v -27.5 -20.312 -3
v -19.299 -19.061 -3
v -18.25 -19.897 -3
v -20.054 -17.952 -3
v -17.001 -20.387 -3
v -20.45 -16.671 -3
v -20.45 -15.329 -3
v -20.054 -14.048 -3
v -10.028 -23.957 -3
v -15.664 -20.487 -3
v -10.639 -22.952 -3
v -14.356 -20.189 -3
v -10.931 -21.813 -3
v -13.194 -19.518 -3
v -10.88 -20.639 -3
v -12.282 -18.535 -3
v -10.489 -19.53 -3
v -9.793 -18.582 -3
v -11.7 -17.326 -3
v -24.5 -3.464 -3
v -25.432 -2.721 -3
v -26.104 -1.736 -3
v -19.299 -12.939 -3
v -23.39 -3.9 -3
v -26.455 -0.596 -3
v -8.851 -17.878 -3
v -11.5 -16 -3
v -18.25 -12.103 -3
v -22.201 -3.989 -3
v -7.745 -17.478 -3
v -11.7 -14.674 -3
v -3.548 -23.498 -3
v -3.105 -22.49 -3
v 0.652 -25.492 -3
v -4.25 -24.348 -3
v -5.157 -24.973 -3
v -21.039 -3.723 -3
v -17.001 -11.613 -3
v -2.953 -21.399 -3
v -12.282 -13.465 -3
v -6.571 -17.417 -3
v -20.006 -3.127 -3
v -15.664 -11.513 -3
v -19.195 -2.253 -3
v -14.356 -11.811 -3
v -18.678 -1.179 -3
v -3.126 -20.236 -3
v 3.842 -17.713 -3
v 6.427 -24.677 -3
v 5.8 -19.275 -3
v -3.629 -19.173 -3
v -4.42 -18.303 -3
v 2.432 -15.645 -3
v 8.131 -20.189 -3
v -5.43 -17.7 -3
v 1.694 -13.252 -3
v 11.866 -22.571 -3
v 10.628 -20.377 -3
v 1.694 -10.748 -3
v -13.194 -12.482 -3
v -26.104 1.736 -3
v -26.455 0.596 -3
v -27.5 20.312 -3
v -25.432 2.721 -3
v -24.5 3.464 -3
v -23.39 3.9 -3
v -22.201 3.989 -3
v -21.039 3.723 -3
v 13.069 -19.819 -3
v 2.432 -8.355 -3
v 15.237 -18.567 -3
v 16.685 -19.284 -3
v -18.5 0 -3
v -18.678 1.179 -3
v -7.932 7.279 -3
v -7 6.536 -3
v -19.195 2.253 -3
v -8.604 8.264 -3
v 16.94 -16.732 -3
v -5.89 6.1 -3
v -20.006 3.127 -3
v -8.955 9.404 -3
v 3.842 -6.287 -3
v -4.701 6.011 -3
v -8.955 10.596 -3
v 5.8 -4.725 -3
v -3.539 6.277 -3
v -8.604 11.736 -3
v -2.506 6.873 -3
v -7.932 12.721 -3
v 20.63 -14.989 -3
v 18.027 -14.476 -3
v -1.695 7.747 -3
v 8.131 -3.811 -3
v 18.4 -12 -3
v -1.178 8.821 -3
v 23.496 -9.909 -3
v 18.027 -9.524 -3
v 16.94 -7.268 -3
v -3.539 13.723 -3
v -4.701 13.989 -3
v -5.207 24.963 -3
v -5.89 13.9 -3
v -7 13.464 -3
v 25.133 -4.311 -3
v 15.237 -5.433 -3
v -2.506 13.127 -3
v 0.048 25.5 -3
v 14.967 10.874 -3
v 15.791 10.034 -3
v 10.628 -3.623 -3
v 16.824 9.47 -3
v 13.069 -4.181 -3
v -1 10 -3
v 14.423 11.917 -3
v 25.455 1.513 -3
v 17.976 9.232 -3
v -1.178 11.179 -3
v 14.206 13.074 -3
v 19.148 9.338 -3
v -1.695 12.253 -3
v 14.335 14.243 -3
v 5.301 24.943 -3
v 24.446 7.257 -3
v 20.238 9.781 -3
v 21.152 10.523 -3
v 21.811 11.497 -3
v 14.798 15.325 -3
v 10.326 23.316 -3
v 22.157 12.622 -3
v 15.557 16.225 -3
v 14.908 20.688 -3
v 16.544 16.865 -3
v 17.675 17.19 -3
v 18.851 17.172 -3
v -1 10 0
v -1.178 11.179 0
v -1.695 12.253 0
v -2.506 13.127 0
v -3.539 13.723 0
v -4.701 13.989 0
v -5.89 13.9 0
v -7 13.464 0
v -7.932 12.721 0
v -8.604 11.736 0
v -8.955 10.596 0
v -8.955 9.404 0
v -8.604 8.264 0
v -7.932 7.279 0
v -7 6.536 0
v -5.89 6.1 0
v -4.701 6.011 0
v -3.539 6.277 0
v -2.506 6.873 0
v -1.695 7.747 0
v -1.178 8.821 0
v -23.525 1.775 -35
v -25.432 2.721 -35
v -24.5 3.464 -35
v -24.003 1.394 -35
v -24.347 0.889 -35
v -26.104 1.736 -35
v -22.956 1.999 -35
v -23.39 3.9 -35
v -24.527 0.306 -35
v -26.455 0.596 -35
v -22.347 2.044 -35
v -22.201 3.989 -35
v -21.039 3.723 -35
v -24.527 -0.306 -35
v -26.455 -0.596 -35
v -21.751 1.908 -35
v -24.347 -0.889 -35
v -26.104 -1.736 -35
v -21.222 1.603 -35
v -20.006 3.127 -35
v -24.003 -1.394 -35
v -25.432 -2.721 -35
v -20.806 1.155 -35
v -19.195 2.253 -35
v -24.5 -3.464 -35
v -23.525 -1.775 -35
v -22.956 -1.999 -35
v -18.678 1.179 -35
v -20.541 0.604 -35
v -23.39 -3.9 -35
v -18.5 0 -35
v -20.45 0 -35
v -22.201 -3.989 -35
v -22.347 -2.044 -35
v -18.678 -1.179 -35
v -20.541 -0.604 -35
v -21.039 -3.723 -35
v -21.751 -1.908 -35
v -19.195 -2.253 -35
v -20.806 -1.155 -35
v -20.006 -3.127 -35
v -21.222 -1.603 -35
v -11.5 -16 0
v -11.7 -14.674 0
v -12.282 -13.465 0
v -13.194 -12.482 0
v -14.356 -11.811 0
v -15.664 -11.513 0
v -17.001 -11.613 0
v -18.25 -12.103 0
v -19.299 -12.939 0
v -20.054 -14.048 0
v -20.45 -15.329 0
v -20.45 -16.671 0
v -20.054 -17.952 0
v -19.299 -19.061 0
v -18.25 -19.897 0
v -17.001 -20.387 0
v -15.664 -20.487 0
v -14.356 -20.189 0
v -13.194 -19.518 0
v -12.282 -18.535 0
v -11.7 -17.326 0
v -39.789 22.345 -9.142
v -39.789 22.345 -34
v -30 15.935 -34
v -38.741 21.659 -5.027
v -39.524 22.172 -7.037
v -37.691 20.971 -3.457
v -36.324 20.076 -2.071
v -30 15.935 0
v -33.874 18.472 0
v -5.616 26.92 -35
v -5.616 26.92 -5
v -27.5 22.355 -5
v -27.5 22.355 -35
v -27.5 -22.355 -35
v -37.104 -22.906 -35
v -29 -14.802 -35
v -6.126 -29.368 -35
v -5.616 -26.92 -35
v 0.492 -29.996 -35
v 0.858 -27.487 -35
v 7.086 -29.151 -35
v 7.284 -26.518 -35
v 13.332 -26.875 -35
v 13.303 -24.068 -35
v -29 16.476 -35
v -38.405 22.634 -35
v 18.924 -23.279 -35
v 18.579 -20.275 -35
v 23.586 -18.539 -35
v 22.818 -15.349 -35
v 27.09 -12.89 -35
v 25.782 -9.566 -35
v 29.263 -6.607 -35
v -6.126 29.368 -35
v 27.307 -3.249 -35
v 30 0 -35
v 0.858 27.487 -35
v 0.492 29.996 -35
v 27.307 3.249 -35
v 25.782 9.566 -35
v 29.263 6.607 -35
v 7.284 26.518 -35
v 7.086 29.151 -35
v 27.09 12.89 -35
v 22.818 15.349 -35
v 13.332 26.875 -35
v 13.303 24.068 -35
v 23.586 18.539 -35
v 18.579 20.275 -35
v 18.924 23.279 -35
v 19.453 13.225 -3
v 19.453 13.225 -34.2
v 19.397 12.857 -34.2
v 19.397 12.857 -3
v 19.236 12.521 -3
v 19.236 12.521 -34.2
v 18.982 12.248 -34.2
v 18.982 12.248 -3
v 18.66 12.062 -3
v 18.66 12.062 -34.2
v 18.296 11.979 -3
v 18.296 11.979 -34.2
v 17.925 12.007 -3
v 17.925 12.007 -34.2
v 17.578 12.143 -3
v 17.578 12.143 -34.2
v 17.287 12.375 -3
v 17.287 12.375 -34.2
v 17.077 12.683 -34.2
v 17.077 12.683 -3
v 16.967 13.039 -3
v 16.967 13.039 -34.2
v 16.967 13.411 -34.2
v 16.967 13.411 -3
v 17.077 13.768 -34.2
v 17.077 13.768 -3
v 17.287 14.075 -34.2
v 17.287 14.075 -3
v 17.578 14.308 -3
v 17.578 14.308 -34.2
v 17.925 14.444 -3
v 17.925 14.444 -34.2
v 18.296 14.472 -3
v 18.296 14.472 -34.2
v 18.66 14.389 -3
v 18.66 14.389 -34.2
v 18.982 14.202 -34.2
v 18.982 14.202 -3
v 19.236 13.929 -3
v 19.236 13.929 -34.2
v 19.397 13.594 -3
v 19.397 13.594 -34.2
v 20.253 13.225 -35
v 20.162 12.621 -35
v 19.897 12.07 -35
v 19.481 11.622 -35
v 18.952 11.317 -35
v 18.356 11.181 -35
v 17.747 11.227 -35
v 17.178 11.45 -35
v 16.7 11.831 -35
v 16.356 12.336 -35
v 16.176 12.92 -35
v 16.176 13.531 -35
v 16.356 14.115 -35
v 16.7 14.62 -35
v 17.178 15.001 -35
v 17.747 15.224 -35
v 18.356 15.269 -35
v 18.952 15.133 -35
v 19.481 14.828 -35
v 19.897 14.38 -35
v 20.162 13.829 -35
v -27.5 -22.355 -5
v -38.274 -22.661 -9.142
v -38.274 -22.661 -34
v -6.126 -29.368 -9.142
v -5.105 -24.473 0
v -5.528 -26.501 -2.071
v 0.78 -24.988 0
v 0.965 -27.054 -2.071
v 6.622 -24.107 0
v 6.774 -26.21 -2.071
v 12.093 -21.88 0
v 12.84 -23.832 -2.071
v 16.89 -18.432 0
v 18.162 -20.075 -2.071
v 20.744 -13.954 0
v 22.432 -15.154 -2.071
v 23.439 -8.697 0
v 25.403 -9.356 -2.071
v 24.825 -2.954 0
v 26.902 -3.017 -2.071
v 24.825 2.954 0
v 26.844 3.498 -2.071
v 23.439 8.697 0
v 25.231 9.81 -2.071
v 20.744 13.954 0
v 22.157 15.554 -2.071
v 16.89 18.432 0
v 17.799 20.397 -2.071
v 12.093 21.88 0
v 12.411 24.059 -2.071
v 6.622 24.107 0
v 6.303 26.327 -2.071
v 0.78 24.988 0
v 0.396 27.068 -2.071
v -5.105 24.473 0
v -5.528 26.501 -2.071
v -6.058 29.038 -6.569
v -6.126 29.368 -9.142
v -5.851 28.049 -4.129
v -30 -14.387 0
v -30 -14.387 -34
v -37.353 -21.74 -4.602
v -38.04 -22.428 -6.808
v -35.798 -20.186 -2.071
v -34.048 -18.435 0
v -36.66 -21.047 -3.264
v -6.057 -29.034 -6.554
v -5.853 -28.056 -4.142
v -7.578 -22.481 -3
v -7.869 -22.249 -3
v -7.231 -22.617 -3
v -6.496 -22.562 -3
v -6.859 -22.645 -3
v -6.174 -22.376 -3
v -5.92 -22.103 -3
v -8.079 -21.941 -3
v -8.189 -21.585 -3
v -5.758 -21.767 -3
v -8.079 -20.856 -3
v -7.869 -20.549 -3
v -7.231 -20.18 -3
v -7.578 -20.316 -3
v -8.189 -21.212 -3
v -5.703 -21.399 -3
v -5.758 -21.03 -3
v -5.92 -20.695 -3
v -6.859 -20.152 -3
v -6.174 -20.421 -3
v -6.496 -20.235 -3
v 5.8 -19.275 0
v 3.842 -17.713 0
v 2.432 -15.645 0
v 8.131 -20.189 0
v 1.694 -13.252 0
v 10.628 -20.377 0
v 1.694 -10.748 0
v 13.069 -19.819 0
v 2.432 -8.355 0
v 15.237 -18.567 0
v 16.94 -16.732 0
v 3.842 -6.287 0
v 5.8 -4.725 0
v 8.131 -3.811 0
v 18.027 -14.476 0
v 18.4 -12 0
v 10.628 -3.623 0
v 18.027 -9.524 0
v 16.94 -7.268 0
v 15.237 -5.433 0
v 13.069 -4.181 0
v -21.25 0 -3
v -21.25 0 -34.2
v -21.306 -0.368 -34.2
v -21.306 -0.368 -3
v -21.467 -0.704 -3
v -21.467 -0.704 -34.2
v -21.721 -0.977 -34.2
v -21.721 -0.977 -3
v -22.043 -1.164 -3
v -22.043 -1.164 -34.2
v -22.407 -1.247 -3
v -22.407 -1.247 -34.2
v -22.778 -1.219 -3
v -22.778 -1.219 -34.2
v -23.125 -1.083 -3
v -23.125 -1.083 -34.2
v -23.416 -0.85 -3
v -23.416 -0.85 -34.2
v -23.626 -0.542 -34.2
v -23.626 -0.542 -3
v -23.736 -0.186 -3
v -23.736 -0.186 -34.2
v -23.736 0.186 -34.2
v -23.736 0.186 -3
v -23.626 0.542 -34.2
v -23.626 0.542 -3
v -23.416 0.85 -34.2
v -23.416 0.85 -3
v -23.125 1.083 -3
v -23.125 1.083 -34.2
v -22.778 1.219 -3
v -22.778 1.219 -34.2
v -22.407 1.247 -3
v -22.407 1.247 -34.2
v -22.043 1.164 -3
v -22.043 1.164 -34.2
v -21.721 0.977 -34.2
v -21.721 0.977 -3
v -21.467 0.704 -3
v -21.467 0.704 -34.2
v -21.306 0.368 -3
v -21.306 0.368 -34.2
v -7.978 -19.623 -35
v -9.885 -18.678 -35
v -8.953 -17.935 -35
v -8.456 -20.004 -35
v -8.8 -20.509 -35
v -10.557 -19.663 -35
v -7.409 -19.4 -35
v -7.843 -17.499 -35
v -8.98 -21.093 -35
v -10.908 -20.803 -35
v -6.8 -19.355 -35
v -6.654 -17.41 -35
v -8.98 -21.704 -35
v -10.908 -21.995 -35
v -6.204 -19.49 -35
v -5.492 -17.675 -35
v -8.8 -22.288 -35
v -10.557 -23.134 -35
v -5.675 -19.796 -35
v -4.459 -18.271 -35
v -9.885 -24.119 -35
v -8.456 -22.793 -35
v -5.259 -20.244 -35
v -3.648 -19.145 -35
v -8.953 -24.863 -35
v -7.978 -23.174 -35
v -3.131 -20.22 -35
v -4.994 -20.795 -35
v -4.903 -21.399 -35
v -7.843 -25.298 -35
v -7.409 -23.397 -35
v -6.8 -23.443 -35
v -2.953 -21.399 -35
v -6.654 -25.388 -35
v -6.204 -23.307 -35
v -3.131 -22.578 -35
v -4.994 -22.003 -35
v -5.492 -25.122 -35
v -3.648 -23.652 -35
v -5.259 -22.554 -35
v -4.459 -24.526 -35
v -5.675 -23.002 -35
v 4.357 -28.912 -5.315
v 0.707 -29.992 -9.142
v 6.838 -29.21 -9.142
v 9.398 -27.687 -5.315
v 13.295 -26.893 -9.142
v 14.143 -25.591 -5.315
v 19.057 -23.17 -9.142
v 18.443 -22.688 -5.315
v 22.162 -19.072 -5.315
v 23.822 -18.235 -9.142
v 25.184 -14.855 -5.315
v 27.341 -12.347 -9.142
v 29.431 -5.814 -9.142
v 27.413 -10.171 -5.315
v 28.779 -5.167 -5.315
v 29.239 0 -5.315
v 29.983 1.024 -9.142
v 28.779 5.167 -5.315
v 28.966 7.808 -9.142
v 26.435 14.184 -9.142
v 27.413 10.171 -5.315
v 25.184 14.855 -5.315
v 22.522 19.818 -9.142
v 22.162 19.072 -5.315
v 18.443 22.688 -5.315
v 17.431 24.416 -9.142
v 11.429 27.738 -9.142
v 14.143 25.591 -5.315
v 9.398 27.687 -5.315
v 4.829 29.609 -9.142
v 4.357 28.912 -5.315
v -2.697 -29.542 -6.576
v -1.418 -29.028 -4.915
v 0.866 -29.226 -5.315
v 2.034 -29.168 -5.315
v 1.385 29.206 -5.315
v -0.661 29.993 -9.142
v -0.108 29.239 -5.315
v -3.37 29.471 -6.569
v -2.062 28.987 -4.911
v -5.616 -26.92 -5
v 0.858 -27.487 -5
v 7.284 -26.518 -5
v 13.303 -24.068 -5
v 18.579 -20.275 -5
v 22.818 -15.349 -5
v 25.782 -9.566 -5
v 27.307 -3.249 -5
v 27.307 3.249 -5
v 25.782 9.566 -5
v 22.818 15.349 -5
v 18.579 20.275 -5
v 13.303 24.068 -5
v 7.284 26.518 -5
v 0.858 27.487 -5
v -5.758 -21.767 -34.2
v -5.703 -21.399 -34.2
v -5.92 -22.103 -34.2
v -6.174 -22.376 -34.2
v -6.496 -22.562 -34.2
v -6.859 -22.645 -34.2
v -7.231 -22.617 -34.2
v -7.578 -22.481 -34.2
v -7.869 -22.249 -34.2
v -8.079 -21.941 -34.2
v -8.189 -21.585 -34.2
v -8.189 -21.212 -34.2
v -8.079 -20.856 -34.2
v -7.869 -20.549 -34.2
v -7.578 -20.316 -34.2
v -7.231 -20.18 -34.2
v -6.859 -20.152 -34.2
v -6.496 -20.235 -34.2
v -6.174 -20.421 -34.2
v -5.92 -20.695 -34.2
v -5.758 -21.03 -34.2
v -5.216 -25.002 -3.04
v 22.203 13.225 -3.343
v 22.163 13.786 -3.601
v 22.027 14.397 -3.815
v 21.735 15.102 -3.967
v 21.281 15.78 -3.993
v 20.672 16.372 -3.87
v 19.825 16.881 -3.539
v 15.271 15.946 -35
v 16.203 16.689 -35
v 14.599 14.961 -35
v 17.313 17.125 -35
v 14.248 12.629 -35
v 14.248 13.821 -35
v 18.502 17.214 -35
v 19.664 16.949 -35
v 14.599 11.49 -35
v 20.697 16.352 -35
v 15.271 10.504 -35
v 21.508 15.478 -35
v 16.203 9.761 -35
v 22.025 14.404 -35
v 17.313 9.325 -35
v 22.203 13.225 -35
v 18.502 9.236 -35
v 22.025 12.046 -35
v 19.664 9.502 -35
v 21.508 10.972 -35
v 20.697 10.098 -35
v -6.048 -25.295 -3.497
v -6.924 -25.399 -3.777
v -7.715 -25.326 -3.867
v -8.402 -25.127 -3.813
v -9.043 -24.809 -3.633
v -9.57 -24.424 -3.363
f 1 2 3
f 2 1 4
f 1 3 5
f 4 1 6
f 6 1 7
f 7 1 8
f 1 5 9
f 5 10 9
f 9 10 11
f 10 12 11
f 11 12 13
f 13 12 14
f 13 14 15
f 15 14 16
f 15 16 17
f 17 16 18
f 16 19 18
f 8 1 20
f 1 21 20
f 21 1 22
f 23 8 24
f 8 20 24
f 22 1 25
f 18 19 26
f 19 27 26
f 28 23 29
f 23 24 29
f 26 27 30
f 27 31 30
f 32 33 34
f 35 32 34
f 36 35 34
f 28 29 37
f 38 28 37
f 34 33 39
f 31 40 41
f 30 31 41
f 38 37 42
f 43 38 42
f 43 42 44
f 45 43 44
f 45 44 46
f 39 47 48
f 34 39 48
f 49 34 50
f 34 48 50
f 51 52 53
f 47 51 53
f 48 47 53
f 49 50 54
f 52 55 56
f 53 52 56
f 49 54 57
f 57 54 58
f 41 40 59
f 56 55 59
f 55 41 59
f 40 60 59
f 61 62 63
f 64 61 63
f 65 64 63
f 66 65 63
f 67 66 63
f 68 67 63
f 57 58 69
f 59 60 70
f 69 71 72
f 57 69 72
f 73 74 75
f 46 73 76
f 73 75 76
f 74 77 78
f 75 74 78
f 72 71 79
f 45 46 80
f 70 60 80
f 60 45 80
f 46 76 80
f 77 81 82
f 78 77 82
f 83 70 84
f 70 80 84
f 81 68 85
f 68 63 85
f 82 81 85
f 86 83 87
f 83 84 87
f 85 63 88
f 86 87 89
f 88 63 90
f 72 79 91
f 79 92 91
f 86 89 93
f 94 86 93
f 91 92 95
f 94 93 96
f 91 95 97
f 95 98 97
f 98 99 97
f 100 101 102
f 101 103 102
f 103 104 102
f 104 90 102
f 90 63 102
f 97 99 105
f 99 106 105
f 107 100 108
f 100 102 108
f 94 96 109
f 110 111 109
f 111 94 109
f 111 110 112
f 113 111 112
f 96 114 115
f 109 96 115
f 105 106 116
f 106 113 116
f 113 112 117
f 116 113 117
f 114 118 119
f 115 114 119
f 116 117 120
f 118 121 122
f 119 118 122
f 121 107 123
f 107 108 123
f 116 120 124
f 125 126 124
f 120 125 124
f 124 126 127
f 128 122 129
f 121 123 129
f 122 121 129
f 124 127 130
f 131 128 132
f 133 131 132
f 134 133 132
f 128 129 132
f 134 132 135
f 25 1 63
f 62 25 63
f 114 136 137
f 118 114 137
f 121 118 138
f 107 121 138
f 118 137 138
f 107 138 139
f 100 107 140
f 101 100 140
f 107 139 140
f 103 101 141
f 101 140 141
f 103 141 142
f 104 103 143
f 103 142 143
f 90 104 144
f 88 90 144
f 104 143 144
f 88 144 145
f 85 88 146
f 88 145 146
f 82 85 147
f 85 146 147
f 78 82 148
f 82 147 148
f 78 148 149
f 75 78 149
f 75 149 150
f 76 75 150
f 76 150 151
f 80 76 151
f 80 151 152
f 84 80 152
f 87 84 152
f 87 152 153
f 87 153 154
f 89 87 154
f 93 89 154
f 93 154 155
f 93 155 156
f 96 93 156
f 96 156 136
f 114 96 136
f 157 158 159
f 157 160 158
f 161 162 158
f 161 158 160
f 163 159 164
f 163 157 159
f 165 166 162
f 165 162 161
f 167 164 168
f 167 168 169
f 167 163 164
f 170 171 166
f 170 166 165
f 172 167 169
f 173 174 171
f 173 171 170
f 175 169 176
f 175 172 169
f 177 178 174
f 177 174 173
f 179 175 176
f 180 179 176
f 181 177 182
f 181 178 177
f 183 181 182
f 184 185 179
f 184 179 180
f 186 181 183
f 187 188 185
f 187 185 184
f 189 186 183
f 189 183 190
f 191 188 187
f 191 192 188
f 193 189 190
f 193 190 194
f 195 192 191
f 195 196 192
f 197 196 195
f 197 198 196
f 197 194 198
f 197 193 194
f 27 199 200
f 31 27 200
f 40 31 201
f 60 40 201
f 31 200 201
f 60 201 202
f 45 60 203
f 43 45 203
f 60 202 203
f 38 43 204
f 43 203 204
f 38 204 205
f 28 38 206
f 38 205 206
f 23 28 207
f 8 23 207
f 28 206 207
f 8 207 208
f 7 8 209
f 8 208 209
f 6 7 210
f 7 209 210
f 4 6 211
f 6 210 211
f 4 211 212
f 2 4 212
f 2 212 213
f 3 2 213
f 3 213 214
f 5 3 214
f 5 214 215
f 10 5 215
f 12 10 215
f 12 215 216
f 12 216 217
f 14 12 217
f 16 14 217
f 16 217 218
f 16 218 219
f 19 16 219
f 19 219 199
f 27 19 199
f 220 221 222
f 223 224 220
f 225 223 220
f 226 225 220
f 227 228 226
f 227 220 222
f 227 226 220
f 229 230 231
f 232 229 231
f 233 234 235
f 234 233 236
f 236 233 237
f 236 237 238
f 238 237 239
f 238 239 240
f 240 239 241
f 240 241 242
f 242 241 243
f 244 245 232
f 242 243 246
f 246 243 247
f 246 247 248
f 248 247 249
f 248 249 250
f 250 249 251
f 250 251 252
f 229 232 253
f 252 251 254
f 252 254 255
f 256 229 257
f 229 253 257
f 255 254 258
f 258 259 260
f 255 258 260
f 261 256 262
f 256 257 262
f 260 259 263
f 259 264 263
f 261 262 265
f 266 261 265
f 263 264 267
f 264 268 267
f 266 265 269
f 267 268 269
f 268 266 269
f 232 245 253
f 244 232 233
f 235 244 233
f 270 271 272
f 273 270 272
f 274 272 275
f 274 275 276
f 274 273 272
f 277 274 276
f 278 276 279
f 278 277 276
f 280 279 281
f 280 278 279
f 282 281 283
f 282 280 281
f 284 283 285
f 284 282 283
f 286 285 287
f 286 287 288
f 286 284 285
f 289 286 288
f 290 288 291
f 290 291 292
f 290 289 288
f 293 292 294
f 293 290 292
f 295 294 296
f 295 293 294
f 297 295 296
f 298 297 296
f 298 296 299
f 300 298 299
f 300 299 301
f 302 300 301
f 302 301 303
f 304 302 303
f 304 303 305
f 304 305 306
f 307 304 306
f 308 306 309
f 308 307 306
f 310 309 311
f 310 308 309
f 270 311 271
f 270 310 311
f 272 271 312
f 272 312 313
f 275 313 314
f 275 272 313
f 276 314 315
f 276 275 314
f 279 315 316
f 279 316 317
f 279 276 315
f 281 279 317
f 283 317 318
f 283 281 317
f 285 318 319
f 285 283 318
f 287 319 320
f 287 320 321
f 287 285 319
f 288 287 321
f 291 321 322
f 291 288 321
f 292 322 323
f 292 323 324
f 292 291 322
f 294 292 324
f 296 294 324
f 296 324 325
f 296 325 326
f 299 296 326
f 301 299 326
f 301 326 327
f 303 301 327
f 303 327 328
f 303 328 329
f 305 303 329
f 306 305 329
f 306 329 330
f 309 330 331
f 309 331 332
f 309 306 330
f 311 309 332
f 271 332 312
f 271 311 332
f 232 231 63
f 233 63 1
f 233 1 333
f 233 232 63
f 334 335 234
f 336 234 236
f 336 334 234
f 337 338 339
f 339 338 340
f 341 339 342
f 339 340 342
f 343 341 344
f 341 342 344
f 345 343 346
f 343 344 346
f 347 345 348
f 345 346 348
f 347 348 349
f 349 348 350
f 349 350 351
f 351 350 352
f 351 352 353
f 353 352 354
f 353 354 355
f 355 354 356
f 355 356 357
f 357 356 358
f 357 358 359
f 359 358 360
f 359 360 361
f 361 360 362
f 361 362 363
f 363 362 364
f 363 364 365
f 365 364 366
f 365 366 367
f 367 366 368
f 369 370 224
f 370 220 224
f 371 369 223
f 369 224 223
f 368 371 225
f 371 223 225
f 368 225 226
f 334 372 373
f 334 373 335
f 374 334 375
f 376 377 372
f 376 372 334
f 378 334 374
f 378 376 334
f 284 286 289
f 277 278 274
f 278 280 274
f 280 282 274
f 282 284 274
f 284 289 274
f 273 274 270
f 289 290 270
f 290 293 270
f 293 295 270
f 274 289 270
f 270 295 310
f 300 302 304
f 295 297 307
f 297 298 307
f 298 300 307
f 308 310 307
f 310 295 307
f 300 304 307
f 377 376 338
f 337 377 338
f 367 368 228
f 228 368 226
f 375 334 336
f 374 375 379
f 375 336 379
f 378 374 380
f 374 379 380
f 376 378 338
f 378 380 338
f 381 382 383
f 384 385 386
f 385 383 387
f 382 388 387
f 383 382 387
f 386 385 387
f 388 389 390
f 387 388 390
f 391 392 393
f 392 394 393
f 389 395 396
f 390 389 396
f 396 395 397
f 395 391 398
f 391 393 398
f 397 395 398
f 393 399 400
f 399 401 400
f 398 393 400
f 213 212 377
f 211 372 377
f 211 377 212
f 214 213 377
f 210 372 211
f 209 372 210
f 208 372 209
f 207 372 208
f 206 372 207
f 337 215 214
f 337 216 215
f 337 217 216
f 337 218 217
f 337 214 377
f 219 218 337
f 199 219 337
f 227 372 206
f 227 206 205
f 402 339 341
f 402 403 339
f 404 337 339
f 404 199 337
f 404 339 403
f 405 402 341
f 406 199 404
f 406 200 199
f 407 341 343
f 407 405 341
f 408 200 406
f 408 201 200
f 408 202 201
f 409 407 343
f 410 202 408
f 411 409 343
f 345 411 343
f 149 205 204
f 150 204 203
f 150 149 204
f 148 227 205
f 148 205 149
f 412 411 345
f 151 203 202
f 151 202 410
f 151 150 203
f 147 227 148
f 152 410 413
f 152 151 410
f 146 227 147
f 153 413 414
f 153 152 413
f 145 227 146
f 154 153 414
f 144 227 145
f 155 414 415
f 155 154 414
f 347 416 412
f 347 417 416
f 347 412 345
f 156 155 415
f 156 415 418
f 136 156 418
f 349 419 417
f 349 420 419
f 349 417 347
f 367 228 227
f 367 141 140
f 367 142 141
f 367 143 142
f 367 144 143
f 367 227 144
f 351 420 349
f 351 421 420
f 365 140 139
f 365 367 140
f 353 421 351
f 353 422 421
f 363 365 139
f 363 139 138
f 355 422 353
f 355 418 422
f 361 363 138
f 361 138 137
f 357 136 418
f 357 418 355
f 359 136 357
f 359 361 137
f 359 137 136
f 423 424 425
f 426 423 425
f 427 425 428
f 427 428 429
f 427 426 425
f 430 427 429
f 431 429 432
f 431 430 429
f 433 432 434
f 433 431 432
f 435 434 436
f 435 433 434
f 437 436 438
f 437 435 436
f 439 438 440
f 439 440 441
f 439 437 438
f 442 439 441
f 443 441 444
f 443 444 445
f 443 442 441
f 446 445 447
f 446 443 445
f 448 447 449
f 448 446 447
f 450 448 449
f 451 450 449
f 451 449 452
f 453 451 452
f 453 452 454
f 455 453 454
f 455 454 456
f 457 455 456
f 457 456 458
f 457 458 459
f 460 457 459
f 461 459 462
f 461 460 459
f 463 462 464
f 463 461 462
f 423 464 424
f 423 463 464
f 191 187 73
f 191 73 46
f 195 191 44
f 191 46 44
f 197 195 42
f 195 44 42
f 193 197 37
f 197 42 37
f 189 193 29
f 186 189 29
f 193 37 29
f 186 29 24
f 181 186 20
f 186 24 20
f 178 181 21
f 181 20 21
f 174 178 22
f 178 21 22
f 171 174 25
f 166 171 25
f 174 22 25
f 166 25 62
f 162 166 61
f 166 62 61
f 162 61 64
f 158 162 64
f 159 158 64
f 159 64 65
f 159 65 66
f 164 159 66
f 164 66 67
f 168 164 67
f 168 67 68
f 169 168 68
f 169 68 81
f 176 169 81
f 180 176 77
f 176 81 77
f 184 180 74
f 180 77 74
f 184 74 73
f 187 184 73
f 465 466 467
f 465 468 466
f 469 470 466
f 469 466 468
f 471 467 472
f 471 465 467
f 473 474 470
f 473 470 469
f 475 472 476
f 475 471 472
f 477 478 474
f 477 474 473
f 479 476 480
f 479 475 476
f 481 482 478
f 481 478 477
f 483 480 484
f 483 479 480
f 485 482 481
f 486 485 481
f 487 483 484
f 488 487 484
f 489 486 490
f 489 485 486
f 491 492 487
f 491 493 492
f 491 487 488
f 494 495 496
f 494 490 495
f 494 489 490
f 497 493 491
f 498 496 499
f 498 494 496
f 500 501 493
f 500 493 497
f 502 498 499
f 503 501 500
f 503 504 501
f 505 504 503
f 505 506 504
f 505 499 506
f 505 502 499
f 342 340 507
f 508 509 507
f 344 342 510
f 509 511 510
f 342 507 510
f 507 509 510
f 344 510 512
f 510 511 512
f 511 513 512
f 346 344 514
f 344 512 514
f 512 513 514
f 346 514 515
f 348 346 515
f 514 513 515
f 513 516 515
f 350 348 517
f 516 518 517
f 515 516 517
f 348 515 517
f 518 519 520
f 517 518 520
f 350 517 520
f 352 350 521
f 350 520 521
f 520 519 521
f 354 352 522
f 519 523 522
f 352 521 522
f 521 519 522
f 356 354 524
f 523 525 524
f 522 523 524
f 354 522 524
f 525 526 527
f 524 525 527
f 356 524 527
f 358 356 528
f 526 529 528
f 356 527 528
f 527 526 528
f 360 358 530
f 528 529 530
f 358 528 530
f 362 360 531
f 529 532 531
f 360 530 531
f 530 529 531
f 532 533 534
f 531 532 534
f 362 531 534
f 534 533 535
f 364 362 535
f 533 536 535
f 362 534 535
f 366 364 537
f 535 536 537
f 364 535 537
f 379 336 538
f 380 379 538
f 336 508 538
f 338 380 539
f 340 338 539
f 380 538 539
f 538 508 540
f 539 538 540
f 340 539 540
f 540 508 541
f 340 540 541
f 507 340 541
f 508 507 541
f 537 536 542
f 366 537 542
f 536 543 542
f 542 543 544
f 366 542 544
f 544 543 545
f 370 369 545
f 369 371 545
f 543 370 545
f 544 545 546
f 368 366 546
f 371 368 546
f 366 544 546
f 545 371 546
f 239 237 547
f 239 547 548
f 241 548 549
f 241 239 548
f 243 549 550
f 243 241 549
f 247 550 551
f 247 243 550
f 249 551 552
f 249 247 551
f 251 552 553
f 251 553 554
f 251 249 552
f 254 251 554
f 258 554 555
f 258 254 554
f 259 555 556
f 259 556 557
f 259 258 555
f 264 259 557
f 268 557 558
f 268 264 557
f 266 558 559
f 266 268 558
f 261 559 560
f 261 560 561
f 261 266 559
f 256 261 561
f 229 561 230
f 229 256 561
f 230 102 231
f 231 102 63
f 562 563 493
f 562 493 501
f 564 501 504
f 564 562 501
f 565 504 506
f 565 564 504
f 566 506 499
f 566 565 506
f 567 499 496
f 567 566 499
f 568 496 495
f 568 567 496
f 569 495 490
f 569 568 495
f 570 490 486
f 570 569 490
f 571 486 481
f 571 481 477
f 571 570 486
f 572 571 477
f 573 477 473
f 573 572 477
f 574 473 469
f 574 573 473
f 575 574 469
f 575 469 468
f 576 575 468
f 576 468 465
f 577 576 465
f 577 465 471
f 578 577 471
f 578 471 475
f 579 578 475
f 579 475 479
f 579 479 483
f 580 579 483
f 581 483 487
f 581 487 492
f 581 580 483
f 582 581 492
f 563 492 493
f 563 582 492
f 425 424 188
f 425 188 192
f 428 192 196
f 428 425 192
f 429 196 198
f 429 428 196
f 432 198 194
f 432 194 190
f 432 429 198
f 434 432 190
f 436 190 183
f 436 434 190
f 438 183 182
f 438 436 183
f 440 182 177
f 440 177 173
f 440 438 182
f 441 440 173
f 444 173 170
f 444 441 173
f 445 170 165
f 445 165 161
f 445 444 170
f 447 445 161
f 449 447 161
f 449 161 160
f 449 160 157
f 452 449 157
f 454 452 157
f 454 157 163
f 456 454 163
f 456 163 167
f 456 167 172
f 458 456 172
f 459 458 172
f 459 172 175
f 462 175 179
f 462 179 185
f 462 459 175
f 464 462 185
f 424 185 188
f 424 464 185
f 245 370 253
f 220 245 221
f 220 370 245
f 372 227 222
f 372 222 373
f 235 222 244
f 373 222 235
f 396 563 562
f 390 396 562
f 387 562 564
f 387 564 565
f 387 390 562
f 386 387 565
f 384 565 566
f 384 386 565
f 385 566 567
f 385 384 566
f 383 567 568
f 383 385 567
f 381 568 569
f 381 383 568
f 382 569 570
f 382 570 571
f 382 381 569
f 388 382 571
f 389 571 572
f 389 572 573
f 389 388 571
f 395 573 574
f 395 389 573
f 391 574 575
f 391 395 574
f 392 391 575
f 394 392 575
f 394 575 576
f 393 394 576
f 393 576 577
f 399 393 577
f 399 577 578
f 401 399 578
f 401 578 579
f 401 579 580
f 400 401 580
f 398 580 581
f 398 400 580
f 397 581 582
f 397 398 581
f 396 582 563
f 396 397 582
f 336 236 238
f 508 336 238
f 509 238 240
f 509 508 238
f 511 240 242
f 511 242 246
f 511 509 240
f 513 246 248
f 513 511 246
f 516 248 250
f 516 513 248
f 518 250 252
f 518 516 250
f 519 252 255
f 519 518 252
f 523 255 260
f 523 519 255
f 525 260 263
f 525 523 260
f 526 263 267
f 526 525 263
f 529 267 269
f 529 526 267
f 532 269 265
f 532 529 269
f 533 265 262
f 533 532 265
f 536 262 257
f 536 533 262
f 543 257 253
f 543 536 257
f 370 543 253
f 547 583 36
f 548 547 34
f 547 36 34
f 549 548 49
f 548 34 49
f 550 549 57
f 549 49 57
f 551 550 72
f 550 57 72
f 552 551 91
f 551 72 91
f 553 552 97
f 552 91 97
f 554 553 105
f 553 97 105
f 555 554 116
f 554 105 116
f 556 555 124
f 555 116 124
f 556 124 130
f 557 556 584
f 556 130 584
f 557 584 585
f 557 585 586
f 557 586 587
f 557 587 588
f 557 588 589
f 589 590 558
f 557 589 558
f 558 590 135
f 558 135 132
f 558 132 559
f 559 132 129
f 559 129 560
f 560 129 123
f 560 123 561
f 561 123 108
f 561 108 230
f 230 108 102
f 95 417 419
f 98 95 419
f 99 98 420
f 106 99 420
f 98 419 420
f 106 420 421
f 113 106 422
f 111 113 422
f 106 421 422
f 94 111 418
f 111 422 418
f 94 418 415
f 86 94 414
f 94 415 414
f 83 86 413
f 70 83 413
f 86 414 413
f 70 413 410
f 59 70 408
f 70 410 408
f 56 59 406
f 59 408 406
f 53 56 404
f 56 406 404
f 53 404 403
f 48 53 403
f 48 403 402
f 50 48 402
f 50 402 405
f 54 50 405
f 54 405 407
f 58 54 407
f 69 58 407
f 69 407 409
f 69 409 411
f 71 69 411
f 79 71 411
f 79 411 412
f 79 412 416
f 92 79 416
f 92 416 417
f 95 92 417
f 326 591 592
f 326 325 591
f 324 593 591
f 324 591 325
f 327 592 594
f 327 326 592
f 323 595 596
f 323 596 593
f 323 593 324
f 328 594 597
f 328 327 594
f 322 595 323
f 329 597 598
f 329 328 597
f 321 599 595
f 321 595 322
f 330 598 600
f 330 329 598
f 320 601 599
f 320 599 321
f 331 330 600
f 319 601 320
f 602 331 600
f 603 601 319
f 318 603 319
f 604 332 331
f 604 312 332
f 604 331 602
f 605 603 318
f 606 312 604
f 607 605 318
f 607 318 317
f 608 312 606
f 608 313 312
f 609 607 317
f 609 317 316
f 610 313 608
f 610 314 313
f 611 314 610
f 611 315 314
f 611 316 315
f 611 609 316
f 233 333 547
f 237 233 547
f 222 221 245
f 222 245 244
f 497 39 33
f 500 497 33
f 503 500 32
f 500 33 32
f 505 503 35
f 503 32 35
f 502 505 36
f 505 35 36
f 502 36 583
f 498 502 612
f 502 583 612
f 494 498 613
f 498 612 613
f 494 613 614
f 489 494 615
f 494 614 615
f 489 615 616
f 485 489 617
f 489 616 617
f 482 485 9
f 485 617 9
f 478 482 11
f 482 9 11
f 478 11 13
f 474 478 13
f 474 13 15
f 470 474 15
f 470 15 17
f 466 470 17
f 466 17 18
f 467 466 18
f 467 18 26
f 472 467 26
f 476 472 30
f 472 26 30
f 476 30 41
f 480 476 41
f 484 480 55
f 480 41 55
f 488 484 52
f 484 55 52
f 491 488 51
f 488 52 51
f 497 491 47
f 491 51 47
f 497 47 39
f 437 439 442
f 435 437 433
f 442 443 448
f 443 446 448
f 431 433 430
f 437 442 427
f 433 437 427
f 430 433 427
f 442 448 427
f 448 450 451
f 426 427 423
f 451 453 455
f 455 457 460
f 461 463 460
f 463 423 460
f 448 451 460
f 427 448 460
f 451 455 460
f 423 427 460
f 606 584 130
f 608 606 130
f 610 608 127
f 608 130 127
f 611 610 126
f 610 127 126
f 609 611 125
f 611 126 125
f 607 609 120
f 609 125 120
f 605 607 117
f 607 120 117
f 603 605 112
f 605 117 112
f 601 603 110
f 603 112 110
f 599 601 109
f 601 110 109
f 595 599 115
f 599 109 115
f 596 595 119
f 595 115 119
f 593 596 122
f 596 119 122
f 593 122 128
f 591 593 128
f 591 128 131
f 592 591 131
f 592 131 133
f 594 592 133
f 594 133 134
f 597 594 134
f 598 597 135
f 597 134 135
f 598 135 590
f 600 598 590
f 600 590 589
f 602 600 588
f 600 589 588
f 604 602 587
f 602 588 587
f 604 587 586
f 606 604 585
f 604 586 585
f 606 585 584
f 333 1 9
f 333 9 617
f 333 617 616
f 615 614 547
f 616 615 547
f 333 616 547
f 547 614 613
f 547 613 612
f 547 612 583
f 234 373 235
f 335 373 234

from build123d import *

# Parameters (mm, degrees)
CROQUIS13_R             = 4.5
CROQUIS13_R_2           = 8.4
CROQUIS13_R_3           = 4
SALIENTE_EXTRUIR5_DEPTH = 35
CORTAR_EXTRUIR7_DEPTH   = 32
CHAFL_N6_SIZE           = 5
CHAFL_N7_SIZE           = 2
CROQUIS15_R             = 4
CROQUIS15_R_2           = 1.25
SALIENTE_EXTRUIR9_DEPTH = 32
CHAFL_N8_SIZE           = 0.8
REDONDEO1_R             = 10
CHAFL_N9_SIZE           = 1


with BuildPart() as part:
    # Croquis13 → Saliente-Extruir5 (new body)
    with BuildSketch(Plane.XY):
        with BuildLine():
            Line((-6.126443354, 29.36778323), (-39.789261077, 22.345348329))
            Line((-39.789261077, 22.345348329), (-30, 15.935417314))
            Line((-30, 15.935417314), (-30, -14.387496114))
            Line((-30, -14.387496114), (-38.2739606, -22.661456714))
            Line((-38.2739606, -22.661456714), (-6.126443354, -29.36778323))
            ThreePointArc((-6.126443354, -29.36778323), (30, 0), (-6.126443354, 29.36778323))
        make_face()
        with Locations((-16, -16)):
            Circle(CROQUIS13_R, mode=Mode.SUBTRACT)
        with Locations((10, -12)):
            Circle(CROQUIS13_R_2, mode=Mode.SUBTRACT)
        with Locations((-5, 10)):
            Circle(CROQUIS13_R_3, mode=Mode.SUBTRACT)
    extrude(amount=-SALIENTE_EXTRUIR5_DEPTH)

    # Croquis14 → Cortar-Extruir7 (cut)
    with BuildSketch(Plane(origin=(0, 0, -35), x_dir=(-1, 0, 0), z_dir=(0, 0, -1))):
        with BuildLine():
            Line((27.5, -22.355204771), (5.615906408, -26.920467961))
            ThreePointArc((5.615906408, -26.920467961), (-27.5, 0), (5.615906408, 26.920467961))
            Line((5.615906408, 26.920467961), (27.5, 22.355204771))
            Line((27.5, 22.355204771), (27.5, -22.355204771))
        make_face()
    extrude(amount=-CORTAR_EXTRUIR7_DEPTH, mode=Mode.SUBTRACT)

    # Chaflán6
    chafl_n6_edges = [part.edges().sort_by_distance(p)[0] for p in [
        (-22.200201977, -26.014619972, 0),
        (-22.957852215, 25.856565779, 0),
        (30, 0, 0),
    ]]
    chamfer(chafl_n6_edges, length=CHAFL_N6_SIZE)

    # Chaflán7
    chafl_n7_edges = [part.edges().sort_by_distance(p)[0] for p in [
        (-16.557953204, 24.637836366, -3),
        (27.5, 0, -3),
        (-16.557953204, -24.637836366, -3),
    ]]
    chamfer(chafl_n7_edges, length=CHAFL_N7_SIZE)

    # Croquis15 → Saliente-Extruir9 (add)
    # profile 1 of 3: a face of its own
    with BuildSketch(Plane(origin=(0, 0, -3), x_dir=(-1, 0, 0), z_dir=(0, 0, -1))):
        with Locations(Location((22.5, 0, 0), (0, 0, 180))):
            Circle(CROQUIS15_R)
        with Locations(Location((22.5, 0, 0), (0, 0, 180))):
            Circle(CROQUIS15_R_2, mode=Mode.SUBTRACT)
    # profile 2 of 3: a face of its own
    with BuildSketch(Plane(origin=(0, 0, -3), x_dir=(-1, 0, 0), z_dir=(0, 0, -1))):
        with Locations(Location((6.952882373, -21.398771617, 0), (0, 0, 180))):
            Circle(CROQUIS15_R)
        with Locations(Location((6.952882373, -21.398771617, 0), (0, 0, 180))):
            Circle(CROQUIS15_R_2, mode=Mode.SUBTRACT)
    # profile 3 of 3: a face of its own
    with BuildSketch(Plane(origin=(0, 0, -3), x_dir=(-1, 0, 0), z_dir=(0, 0, -1))):
        with Locations(Location((-18.202882373, 13.225168177, 0), (0, 0, 180))):
            Circle(CROQUIS15_R)
        with Locations(Location((-18.202882373, 13.225168177, 0), (0, 0, 180))):
            Circle(CROQUIS15_R_2, mode=Mode.SUBTRACT)
    extrude(amount=SALIENTE_EXTRUIR9_DEPTH)

    # Chaflán8
    chafl_n8_edges = [part.edges().sort_by_distance(p)[0] for p in [
        (-23.75, 0, -35),
        (-8.202882373, -21.398771617, -35),
        (16.952882373, 13.225168177, -35),
    ]]
    chamfer(chafl_n8_edges, length=CHAFL_N8_SIZE)

    # Redondeo1
    redondeo1_edges = [part.edges().sort_by_distance(p)[0] for p in [
        (-22.957852215, 25.856565779, -5),
        (30, 0, -5),
        (-22.200201977, -26.014619972, -5),
    ]]
    fillet(redondeo1_edges, radius=REDONDEO1_R)

    # Chaflán9
    chafl_n9_edges = [part.edges().sort_by_distance(p)[0] for p in [
        (-34.894630538, 19.140382822, -35),
        (-30, 0.7739606, -35),
        (-34.1369803, -18.524476414, -35),
    ]]
    chamfer(chafl_n9_edges, length=CHAFL_N9_SIZE)


solid = part.part
